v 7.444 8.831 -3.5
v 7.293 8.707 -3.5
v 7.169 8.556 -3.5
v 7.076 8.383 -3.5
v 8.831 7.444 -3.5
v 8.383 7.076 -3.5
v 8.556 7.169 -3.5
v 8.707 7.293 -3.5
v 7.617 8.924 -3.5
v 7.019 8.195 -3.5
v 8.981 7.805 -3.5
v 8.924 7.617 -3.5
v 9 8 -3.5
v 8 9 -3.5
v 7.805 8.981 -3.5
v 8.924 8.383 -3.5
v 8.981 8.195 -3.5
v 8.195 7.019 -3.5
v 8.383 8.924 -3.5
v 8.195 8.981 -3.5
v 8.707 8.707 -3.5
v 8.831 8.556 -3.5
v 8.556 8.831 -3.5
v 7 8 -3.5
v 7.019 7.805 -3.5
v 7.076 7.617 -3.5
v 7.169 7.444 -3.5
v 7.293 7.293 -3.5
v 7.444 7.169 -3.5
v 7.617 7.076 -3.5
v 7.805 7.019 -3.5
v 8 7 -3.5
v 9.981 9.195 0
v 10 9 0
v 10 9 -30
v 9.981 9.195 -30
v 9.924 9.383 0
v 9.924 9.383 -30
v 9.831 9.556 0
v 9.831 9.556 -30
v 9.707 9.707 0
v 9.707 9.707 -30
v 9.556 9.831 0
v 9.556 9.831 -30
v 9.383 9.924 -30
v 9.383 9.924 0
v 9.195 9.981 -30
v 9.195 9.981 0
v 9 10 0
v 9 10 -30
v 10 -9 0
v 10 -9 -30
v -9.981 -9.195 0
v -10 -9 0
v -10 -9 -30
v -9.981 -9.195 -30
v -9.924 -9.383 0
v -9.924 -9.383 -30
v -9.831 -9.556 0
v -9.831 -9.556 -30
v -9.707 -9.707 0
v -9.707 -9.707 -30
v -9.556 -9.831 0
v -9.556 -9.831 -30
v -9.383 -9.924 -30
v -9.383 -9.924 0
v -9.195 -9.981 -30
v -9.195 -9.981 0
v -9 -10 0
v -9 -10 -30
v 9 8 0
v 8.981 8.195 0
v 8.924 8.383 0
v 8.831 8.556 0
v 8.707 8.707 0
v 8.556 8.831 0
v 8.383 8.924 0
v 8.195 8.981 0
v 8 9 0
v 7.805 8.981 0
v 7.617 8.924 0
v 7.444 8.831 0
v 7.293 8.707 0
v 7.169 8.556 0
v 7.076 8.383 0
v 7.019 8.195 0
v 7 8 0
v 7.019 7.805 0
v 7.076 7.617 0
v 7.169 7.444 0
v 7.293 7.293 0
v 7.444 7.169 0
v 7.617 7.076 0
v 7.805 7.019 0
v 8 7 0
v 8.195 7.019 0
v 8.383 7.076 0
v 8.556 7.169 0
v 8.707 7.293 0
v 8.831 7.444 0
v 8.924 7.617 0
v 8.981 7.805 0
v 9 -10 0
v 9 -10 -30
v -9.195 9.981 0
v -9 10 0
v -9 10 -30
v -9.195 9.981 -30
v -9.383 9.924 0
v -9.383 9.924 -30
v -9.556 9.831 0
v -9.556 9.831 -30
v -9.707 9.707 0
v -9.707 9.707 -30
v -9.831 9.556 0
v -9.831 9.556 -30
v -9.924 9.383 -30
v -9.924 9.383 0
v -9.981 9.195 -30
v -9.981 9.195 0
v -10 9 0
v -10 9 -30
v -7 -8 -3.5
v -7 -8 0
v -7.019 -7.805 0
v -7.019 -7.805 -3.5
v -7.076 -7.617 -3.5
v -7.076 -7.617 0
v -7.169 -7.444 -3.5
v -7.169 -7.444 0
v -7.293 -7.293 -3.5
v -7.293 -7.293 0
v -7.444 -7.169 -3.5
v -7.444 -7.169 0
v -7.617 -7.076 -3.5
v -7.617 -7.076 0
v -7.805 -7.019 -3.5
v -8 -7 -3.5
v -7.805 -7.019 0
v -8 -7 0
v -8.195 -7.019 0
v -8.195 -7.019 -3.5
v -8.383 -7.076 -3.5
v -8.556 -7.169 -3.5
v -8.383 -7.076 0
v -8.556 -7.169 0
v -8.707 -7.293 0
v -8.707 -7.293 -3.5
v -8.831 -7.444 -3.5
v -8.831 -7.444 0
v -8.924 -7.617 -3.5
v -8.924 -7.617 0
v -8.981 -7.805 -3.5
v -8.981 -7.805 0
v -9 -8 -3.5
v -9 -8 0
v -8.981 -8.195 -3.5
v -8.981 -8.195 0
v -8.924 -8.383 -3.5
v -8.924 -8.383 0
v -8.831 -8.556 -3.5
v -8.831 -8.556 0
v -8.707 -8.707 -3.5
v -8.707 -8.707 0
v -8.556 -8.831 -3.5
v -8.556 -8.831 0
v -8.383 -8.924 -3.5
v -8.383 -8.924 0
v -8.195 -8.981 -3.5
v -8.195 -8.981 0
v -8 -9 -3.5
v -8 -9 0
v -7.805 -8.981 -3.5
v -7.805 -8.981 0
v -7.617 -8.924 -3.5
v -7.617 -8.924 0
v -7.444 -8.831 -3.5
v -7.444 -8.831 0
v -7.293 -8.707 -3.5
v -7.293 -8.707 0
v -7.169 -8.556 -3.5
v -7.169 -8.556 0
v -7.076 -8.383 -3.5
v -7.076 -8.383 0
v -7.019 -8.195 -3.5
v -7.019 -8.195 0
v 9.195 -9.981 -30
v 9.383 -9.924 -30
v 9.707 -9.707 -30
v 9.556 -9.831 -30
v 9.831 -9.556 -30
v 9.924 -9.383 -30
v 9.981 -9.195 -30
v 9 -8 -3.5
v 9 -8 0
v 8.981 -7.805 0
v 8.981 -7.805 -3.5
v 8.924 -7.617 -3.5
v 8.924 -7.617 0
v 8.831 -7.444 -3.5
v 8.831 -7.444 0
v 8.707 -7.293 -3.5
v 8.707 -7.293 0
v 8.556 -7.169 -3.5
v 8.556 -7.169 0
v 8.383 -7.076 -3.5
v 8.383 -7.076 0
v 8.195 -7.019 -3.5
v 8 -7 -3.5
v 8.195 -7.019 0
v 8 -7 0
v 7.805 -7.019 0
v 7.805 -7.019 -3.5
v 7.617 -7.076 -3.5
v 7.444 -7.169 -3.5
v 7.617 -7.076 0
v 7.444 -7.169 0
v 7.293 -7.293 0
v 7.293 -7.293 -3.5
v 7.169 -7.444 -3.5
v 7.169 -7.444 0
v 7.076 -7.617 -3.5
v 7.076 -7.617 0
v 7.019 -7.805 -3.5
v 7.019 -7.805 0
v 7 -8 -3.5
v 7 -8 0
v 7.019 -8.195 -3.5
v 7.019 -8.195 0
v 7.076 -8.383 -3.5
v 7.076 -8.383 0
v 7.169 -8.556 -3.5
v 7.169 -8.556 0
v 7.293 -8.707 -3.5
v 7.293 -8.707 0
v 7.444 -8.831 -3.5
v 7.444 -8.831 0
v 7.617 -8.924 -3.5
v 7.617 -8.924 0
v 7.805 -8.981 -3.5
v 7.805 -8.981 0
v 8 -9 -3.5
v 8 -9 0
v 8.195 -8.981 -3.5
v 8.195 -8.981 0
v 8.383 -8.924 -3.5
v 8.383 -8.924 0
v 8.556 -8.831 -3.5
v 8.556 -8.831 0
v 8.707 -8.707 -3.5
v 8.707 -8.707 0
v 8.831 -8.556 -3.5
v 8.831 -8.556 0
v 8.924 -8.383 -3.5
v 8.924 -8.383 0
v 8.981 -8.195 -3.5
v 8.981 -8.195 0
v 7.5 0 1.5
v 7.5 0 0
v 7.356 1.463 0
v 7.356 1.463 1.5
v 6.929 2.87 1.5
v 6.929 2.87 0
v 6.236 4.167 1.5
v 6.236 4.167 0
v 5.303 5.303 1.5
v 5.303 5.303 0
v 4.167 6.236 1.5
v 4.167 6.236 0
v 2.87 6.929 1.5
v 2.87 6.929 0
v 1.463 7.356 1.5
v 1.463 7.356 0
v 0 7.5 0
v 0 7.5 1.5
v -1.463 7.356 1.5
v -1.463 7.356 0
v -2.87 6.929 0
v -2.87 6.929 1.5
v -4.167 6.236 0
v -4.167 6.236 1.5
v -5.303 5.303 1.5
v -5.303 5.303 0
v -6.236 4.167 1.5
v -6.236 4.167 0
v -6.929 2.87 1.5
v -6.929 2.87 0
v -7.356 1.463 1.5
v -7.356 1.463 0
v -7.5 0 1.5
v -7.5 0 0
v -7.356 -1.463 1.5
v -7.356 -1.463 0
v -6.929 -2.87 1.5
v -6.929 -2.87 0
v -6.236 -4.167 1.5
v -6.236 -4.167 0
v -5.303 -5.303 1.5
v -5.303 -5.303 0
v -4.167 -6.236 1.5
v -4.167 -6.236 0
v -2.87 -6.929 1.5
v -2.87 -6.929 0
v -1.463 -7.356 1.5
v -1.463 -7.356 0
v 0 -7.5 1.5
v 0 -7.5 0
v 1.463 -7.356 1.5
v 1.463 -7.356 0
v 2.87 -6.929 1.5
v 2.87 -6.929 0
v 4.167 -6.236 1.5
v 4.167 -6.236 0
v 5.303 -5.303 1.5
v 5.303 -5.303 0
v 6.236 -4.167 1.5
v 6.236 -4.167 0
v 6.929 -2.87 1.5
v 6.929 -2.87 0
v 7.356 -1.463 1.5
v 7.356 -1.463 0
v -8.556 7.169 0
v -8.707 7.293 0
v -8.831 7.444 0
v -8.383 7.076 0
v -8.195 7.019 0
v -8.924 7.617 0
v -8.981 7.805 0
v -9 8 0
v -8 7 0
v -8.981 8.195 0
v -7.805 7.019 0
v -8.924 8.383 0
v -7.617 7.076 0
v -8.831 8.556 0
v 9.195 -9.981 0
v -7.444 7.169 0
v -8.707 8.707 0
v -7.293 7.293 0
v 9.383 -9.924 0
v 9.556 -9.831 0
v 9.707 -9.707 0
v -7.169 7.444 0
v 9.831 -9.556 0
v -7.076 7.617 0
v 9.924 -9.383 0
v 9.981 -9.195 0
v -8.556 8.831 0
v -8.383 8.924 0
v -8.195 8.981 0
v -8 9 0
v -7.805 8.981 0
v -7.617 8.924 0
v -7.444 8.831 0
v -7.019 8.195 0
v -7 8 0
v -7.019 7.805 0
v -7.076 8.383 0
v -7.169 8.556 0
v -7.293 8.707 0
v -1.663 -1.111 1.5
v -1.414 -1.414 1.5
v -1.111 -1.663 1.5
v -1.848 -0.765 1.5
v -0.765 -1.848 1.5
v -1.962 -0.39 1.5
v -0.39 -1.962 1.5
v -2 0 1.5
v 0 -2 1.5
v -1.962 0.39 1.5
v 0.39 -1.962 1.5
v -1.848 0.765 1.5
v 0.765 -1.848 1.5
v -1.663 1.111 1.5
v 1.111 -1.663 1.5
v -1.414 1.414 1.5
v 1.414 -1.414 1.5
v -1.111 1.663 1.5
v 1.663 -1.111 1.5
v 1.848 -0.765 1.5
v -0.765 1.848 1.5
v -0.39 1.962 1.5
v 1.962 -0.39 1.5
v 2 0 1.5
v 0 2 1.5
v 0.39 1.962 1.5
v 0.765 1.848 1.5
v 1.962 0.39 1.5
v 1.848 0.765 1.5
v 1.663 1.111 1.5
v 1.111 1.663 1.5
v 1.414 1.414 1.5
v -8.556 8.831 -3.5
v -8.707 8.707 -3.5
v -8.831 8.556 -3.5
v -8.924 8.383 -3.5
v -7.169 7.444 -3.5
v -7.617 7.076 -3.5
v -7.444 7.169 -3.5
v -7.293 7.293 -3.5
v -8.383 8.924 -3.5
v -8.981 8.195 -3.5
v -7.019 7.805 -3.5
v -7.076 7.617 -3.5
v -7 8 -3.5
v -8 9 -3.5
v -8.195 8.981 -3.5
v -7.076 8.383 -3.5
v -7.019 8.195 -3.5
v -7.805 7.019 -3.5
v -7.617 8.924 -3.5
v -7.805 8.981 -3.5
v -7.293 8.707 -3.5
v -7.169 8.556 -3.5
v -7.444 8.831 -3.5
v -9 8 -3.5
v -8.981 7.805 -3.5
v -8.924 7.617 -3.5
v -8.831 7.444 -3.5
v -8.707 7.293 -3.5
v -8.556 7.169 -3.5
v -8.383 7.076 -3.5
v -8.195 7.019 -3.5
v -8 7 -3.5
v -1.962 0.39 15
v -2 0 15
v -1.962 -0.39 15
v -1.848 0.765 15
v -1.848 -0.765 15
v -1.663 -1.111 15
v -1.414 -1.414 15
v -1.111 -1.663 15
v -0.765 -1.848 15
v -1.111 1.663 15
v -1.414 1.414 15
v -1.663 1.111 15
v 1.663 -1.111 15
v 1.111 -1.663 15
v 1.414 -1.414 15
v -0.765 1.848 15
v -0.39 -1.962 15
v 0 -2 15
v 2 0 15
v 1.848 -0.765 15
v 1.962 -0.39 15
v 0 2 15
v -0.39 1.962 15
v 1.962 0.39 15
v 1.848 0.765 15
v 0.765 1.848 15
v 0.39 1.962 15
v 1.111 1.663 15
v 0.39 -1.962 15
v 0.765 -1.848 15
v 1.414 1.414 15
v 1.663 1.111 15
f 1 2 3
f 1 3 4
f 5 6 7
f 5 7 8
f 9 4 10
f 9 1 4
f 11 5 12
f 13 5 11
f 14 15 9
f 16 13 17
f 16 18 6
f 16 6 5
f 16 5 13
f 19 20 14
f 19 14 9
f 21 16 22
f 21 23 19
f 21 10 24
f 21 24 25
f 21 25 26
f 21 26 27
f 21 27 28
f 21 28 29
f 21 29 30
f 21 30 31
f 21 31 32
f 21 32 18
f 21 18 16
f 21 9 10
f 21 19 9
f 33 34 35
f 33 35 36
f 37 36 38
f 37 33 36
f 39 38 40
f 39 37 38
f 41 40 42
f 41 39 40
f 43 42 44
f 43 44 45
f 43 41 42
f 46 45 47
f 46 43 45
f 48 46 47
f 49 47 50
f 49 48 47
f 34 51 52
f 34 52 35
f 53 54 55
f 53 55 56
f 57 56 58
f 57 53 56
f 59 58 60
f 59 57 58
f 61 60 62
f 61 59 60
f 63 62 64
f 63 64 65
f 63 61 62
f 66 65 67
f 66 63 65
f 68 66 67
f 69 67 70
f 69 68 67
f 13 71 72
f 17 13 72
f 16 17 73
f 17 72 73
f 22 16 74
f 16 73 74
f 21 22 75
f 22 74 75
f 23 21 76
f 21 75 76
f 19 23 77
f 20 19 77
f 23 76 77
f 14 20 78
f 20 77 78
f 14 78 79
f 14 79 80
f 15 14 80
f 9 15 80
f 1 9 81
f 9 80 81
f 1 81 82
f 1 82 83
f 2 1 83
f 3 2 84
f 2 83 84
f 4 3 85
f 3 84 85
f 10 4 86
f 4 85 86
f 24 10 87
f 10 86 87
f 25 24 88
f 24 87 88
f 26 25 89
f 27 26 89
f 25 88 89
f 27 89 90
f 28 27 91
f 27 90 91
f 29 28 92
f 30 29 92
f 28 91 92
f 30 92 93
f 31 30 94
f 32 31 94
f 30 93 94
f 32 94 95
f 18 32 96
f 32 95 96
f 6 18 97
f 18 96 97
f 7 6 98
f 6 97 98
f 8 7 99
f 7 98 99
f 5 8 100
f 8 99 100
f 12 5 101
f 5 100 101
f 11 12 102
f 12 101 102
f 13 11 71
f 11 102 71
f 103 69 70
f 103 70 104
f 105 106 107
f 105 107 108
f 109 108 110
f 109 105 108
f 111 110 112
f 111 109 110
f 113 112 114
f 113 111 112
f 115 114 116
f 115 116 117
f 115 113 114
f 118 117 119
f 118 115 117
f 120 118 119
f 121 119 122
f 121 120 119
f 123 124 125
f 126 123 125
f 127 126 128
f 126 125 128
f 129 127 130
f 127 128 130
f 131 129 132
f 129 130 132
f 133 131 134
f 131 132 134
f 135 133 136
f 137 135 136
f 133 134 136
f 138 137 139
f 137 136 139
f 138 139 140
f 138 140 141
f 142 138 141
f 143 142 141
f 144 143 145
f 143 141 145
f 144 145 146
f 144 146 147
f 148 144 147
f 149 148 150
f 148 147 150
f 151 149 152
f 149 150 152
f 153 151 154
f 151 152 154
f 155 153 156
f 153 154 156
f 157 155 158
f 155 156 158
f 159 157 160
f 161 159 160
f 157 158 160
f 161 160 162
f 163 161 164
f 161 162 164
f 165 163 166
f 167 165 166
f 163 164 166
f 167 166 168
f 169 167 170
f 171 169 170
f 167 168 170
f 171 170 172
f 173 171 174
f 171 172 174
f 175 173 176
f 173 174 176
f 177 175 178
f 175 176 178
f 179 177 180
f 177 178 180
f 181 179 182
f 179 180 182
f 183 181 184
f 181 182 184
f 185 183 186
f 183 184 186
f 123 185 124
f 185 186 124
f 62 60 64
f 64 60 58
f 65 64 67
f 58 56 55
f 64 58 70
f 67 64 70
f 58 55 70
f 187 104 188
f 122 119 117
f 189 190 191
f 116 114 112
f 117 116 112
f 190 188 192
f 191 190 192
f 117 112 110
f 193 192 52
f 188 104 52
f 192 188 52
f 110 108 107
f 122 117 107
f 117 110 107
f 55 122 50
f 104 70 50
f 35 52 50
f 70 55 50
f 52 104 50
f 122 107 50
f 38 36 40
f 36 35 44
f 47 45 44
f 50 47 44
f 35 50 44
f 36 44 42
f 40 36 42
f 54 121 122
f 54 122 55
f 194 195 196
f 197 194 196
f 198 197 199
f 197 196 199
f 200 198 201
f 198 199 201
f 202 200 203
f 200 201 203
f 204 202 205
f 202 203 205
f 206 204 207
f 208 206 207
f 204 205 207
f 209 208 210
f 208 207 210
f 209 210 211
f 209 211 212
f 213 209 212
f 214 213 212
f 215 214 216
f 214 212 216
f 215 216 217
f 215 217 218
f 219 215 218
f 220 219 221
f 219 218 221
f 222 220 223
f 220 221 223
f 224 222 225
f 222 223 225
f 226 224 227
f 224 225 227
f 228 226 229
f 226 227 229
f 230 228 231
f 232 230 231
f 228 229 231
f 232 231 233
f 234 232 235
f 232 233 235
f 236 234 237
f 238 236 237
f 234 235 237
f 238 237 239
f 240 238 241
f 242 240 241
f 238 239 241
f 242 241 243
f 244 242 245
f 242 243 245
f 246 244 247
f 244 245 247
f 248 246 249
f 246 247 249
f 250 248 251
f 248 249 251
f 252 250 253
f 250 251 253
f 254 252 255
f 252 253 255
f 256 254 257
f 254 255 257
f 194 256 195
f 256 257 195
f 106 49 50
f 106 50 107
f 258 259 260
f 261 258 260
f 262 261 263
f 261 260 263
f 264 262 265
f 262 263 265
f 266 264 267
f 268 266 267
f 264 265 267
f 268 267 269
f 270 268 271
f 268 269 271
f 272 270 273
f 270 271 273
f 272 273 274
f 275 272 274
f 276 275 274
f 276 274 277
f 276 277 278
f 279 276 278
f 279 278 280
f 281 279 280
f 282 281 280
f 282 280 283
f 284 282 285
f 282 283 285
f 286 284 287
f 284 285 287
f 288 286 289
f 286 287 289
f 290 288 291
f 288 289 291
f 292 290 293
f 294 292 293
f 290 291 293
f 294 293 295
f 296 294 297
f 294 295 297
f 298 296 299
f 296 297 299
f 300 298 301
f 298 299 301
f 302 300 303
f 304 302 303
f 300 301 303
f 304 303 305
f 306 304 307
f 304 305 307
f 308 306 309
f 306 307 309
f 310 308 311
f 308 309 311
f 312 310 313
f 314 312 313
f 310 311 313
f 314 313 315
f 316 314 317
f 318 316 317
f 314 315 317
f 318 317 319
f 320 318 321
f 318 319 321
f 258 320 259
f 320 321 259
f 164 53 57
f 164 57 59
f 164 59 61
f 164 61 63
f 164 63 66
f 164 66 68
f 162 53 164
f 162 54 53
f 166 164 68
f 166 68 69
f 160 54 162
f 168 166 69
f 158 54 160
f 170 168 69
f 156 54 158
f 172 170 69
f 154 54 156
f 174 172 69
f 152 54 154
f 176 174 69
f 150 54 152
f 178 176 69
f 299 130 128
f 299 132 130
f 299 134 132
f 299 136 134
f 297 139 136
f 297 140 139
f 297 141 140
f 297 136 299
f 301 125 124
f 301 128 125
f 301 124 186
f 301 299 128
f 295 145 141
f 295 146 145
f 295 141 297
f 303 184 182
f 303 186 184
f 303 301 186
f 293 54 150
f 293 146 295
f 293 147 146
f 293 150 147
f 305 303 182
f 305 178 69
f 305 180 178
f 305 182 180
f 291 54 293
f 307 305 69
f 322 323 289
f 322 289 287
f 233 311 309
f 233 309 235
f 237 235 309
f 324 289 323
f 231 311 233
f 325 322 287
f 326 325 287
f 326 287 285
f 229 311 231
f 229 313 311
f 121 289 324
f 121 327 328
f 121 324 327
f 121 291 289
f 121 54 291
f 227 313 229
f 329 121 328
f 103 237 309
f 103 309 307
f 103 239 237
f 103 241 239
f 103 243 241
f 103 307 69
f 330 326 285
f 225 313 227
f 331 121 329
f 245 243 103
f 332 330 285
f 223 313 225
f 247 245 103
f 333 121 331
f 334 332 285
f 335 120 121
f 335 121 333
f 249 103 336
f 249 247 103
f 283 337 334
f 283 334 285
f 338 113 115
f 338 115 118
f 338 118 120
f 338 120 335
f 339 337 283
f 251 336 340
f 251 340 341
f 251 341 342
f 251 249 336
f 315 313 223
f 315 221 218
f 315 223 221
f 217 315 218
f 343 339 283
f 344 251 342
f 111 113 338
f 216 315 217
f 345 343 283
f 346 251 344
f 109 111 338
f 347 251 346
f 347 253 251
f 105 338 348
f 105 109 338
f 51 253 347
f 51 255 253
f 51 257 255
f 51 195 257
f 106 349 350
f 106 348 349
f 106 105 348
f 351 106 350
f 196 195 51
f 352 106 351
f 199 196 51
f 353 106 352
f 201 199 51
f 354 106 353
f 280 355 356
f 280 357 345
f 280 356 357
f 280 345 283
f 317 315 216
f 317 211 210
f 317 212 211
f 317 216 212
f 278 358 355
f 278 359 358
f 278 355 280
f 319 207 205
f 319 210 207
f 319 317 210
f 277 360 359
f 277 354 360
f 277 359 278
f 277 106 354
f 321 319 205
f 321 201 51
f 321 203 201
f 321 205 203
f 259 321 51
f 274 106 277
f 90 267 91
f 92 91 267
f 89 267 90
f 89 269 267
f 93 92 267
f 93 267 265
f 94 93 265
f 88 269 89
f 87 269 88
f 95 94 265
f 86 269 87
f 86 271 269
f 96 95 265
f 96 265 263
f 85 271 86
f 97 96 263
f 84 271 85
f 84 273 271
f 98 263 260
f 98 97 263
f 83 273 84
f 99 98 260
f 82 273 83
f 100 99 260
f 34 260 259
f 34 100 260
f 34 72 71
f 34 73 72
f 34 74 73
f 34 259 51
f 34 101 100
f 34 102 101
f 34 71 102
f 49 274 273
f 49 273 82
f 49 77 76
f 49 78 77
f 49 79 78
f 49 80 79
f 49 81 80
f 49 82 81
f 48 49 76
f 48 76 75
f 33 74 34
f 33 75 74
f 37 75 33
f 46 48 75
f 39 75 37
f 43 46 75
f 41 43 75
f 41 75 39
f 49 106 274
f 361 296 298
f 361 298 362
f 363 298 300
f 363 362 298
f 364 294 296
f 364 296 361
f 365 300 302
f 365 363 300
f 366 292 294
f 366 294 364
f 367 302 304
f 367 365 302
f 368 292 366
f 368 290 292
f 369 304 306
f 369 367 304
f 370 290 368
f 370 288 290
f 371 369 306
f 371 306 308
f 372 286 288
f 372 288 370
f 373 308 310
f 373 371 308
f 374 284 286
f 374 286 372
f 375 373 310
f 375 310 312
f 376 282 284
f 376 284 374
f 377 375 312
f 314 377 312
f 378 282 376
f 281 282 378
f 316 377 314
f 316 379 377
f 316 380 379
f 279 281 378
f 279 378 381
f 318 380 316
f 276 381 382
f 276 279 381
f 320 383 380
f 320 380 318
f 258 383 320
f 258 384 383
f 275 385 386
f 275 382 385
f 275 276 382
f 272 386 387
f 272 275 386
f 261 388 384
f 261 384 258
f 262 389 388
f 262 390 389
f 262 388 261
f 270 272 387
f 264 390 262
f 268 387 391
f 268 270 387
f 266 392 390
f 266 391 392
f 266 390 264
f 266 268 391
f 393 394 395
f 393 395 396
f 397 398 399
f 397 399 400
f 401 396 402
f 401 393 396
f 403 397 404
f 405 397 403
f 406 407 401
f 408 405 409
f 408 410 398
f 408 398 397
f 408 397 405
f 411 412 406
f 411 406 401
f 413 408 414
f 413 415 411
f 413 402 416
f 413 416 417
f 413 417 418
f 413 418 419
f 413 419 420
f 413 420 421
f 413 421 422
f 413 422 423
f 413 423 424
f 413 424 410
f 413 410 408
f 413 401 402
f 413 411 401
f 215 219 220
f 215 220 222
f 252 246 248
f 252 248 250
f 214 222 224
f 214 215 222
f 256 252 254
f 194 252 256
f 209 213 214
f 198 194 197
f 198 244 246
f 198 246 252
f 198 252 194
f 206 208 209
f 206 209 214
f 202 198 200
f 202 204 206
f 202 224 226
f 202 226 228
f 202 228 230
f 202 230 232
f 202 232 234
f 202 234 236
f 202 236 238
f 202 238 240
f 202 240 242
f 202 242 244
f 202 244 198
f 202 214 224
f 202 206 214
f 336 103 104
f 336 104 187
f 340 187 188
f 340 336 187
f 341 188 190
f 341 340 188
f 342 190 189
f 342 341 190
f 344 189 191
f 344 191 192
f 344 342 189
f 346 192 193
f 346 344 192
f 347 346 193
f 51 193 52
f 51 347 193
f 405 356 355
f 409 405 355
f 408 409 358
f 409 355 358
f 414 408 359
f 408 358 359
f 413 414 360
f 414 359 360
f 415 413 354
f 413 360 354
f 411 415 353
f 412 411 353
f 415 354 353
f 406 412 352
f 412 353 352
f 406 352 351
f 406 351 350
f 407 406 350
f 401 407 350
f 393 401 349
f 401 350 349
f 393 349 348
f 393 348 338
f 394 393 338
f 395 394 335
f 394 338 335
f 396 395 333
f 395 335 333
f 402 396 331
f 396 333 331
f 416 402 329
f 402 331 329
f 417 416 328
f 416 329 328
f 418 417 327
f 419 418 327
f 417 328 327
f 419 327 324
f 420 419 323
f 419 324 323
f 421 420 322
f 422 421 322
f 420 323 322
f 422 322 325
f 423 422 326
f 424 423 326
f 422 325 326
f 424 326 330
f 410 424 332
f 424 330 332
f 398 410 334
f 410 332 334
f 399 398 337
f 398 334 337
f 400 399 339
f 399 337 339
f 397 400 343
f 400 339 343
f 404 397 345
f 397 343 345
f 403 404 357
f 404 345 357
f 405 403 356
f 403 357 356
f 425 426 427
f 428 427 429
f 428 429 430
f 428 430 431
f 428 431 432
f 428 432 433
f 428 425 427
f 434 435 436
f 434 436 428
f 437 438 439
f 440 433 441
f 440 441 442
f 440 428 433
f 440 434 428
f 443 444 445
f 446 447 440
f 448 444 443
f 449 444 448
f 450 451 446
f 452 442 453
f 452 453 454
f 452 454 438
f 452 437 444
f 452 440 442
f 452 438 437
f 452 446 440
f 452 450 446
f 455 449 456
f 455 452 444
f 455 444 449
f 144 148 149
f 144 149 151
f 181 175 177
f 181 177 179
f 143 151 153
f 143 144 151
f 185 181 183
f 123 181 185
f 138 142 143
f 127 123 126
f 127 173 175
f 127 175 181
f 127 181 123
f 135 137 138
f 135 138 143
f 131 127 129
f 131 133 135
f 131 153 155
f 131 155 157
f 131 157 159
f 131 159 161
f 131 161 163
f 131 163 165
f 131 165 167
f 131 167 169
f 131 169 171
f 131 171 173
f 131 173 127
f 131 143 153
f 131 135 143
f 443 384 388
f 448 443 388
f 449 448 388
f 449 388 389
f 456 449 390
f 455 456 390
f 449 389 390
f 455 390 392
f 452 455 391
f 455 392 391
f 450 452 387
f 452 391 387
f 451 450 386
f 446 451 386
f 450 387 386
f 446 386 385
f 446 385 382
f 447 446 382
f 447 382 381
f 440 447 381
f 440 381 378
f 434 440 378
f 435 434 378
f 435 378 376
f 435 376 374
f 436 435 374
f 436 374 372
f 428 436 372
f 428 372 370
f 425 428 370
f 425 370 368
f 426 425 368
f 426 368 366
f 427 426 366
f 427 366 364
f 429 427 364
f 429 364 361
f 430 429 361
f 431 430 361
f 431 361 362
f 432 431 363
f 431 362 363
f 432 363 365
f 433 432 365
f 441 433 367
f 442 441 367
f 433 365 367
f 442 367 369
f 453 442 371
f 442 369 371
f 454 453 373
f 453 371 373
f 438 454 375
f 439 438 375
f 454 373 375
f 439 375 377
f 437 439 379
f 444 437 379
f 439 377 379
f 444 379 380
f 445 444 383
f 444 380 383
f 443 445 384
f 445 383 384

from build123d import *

# Parameters (mm, degrees)
F0_R     = 1
F0_R_2   = 7.5
F0_R_3   = 2
F1_DEPTH = 30
F2_DEPTH = 3.5
F3_DEPTH = 15
F4_DEPTH = 1.5


with BuildPart() as f1:
    # F0 (on Top) → F1 (new body)
    with BuildSketch(Plane.XY):
        with BuildLine():
            ThreePointArc((10, 9), (9.7071067812, 9.7071067812), (9, 10))
            Line((9, 10), (-9, 10))
            ThreePointArc((-9, 10), (-9.7071067812, 9.7071067812), (-10, 9))
            Line((-10, 9), (-10, -9))
            ThreePointArc((-10, -9), (-9.7071067812, -9.7071067812), (-9, -10))
            Line((-9, -10), (9, -10))
            ThreePointArc((9, -10), (9.7071067812, -9.7071067812), (10, -9))
            Line((10, -9), (10, 9))
        make_face()
        with Locations((-8, -8)):
            Circle(F0_R, mode=Mode.SUBTRACT)
        with Locations((8, -8)):
            Circle(F0_R, mode=Mode.SUBTRACT)
        with Locations((-8, 8)):
            Circle(F0_R, mode=Mode.SUBTRACT)
        Circle(F0_R_2, mode=Mode.SUBTRACT)
        with Locations((8, 8)):
            Circle(F0_R, mode=Mode.SUBTRACT)
        Circle(F0_R_2)
        Circle(F0_R_3, mode=Mode.SUBTRACT)
        Circle(F0_R_3)
        with Locations((-8, -8)):
            Circle(F0_R)
        with Locations((8, 8)):
            Circle(F0_R)
        with Locations((8, -8)):
            Circle(F0_R)
        with Locations((-8, 8)):
            Circle(F0_R)
    extrude(amount=-F1_DEPTH)

    # F0 (on Top) → F2 (cut)
    with BuildSketch(Plane.XY):
        with Locations((-8, 8)):
            Circle(F0_R)
        with Locations((8, 8)):
            Circle(F0_R)
        with Locations((-8, -8)):
            Circle(F0_R)
        with Locations((8, -8)):
            Circle(F0_R)
    extrude(amount=-F2_DEPTH, mode=Mode.SUBTRACT)

    # F0 (on Top) → F3 (join)
    with BuildSketch(Plane.XY):
        Circle(F0_R_3)
    extrude(amount=F3_DEPTH)

    # F0 (on Top) → F4 (join)
    with BuildSketch(Plane.XY):
        Circle(F0_R_2)
        Circle(F0_R_3, mode=Mode.SUBTRACT)
    extrude(amount=F4_DEPTH)


solid = f1.part
